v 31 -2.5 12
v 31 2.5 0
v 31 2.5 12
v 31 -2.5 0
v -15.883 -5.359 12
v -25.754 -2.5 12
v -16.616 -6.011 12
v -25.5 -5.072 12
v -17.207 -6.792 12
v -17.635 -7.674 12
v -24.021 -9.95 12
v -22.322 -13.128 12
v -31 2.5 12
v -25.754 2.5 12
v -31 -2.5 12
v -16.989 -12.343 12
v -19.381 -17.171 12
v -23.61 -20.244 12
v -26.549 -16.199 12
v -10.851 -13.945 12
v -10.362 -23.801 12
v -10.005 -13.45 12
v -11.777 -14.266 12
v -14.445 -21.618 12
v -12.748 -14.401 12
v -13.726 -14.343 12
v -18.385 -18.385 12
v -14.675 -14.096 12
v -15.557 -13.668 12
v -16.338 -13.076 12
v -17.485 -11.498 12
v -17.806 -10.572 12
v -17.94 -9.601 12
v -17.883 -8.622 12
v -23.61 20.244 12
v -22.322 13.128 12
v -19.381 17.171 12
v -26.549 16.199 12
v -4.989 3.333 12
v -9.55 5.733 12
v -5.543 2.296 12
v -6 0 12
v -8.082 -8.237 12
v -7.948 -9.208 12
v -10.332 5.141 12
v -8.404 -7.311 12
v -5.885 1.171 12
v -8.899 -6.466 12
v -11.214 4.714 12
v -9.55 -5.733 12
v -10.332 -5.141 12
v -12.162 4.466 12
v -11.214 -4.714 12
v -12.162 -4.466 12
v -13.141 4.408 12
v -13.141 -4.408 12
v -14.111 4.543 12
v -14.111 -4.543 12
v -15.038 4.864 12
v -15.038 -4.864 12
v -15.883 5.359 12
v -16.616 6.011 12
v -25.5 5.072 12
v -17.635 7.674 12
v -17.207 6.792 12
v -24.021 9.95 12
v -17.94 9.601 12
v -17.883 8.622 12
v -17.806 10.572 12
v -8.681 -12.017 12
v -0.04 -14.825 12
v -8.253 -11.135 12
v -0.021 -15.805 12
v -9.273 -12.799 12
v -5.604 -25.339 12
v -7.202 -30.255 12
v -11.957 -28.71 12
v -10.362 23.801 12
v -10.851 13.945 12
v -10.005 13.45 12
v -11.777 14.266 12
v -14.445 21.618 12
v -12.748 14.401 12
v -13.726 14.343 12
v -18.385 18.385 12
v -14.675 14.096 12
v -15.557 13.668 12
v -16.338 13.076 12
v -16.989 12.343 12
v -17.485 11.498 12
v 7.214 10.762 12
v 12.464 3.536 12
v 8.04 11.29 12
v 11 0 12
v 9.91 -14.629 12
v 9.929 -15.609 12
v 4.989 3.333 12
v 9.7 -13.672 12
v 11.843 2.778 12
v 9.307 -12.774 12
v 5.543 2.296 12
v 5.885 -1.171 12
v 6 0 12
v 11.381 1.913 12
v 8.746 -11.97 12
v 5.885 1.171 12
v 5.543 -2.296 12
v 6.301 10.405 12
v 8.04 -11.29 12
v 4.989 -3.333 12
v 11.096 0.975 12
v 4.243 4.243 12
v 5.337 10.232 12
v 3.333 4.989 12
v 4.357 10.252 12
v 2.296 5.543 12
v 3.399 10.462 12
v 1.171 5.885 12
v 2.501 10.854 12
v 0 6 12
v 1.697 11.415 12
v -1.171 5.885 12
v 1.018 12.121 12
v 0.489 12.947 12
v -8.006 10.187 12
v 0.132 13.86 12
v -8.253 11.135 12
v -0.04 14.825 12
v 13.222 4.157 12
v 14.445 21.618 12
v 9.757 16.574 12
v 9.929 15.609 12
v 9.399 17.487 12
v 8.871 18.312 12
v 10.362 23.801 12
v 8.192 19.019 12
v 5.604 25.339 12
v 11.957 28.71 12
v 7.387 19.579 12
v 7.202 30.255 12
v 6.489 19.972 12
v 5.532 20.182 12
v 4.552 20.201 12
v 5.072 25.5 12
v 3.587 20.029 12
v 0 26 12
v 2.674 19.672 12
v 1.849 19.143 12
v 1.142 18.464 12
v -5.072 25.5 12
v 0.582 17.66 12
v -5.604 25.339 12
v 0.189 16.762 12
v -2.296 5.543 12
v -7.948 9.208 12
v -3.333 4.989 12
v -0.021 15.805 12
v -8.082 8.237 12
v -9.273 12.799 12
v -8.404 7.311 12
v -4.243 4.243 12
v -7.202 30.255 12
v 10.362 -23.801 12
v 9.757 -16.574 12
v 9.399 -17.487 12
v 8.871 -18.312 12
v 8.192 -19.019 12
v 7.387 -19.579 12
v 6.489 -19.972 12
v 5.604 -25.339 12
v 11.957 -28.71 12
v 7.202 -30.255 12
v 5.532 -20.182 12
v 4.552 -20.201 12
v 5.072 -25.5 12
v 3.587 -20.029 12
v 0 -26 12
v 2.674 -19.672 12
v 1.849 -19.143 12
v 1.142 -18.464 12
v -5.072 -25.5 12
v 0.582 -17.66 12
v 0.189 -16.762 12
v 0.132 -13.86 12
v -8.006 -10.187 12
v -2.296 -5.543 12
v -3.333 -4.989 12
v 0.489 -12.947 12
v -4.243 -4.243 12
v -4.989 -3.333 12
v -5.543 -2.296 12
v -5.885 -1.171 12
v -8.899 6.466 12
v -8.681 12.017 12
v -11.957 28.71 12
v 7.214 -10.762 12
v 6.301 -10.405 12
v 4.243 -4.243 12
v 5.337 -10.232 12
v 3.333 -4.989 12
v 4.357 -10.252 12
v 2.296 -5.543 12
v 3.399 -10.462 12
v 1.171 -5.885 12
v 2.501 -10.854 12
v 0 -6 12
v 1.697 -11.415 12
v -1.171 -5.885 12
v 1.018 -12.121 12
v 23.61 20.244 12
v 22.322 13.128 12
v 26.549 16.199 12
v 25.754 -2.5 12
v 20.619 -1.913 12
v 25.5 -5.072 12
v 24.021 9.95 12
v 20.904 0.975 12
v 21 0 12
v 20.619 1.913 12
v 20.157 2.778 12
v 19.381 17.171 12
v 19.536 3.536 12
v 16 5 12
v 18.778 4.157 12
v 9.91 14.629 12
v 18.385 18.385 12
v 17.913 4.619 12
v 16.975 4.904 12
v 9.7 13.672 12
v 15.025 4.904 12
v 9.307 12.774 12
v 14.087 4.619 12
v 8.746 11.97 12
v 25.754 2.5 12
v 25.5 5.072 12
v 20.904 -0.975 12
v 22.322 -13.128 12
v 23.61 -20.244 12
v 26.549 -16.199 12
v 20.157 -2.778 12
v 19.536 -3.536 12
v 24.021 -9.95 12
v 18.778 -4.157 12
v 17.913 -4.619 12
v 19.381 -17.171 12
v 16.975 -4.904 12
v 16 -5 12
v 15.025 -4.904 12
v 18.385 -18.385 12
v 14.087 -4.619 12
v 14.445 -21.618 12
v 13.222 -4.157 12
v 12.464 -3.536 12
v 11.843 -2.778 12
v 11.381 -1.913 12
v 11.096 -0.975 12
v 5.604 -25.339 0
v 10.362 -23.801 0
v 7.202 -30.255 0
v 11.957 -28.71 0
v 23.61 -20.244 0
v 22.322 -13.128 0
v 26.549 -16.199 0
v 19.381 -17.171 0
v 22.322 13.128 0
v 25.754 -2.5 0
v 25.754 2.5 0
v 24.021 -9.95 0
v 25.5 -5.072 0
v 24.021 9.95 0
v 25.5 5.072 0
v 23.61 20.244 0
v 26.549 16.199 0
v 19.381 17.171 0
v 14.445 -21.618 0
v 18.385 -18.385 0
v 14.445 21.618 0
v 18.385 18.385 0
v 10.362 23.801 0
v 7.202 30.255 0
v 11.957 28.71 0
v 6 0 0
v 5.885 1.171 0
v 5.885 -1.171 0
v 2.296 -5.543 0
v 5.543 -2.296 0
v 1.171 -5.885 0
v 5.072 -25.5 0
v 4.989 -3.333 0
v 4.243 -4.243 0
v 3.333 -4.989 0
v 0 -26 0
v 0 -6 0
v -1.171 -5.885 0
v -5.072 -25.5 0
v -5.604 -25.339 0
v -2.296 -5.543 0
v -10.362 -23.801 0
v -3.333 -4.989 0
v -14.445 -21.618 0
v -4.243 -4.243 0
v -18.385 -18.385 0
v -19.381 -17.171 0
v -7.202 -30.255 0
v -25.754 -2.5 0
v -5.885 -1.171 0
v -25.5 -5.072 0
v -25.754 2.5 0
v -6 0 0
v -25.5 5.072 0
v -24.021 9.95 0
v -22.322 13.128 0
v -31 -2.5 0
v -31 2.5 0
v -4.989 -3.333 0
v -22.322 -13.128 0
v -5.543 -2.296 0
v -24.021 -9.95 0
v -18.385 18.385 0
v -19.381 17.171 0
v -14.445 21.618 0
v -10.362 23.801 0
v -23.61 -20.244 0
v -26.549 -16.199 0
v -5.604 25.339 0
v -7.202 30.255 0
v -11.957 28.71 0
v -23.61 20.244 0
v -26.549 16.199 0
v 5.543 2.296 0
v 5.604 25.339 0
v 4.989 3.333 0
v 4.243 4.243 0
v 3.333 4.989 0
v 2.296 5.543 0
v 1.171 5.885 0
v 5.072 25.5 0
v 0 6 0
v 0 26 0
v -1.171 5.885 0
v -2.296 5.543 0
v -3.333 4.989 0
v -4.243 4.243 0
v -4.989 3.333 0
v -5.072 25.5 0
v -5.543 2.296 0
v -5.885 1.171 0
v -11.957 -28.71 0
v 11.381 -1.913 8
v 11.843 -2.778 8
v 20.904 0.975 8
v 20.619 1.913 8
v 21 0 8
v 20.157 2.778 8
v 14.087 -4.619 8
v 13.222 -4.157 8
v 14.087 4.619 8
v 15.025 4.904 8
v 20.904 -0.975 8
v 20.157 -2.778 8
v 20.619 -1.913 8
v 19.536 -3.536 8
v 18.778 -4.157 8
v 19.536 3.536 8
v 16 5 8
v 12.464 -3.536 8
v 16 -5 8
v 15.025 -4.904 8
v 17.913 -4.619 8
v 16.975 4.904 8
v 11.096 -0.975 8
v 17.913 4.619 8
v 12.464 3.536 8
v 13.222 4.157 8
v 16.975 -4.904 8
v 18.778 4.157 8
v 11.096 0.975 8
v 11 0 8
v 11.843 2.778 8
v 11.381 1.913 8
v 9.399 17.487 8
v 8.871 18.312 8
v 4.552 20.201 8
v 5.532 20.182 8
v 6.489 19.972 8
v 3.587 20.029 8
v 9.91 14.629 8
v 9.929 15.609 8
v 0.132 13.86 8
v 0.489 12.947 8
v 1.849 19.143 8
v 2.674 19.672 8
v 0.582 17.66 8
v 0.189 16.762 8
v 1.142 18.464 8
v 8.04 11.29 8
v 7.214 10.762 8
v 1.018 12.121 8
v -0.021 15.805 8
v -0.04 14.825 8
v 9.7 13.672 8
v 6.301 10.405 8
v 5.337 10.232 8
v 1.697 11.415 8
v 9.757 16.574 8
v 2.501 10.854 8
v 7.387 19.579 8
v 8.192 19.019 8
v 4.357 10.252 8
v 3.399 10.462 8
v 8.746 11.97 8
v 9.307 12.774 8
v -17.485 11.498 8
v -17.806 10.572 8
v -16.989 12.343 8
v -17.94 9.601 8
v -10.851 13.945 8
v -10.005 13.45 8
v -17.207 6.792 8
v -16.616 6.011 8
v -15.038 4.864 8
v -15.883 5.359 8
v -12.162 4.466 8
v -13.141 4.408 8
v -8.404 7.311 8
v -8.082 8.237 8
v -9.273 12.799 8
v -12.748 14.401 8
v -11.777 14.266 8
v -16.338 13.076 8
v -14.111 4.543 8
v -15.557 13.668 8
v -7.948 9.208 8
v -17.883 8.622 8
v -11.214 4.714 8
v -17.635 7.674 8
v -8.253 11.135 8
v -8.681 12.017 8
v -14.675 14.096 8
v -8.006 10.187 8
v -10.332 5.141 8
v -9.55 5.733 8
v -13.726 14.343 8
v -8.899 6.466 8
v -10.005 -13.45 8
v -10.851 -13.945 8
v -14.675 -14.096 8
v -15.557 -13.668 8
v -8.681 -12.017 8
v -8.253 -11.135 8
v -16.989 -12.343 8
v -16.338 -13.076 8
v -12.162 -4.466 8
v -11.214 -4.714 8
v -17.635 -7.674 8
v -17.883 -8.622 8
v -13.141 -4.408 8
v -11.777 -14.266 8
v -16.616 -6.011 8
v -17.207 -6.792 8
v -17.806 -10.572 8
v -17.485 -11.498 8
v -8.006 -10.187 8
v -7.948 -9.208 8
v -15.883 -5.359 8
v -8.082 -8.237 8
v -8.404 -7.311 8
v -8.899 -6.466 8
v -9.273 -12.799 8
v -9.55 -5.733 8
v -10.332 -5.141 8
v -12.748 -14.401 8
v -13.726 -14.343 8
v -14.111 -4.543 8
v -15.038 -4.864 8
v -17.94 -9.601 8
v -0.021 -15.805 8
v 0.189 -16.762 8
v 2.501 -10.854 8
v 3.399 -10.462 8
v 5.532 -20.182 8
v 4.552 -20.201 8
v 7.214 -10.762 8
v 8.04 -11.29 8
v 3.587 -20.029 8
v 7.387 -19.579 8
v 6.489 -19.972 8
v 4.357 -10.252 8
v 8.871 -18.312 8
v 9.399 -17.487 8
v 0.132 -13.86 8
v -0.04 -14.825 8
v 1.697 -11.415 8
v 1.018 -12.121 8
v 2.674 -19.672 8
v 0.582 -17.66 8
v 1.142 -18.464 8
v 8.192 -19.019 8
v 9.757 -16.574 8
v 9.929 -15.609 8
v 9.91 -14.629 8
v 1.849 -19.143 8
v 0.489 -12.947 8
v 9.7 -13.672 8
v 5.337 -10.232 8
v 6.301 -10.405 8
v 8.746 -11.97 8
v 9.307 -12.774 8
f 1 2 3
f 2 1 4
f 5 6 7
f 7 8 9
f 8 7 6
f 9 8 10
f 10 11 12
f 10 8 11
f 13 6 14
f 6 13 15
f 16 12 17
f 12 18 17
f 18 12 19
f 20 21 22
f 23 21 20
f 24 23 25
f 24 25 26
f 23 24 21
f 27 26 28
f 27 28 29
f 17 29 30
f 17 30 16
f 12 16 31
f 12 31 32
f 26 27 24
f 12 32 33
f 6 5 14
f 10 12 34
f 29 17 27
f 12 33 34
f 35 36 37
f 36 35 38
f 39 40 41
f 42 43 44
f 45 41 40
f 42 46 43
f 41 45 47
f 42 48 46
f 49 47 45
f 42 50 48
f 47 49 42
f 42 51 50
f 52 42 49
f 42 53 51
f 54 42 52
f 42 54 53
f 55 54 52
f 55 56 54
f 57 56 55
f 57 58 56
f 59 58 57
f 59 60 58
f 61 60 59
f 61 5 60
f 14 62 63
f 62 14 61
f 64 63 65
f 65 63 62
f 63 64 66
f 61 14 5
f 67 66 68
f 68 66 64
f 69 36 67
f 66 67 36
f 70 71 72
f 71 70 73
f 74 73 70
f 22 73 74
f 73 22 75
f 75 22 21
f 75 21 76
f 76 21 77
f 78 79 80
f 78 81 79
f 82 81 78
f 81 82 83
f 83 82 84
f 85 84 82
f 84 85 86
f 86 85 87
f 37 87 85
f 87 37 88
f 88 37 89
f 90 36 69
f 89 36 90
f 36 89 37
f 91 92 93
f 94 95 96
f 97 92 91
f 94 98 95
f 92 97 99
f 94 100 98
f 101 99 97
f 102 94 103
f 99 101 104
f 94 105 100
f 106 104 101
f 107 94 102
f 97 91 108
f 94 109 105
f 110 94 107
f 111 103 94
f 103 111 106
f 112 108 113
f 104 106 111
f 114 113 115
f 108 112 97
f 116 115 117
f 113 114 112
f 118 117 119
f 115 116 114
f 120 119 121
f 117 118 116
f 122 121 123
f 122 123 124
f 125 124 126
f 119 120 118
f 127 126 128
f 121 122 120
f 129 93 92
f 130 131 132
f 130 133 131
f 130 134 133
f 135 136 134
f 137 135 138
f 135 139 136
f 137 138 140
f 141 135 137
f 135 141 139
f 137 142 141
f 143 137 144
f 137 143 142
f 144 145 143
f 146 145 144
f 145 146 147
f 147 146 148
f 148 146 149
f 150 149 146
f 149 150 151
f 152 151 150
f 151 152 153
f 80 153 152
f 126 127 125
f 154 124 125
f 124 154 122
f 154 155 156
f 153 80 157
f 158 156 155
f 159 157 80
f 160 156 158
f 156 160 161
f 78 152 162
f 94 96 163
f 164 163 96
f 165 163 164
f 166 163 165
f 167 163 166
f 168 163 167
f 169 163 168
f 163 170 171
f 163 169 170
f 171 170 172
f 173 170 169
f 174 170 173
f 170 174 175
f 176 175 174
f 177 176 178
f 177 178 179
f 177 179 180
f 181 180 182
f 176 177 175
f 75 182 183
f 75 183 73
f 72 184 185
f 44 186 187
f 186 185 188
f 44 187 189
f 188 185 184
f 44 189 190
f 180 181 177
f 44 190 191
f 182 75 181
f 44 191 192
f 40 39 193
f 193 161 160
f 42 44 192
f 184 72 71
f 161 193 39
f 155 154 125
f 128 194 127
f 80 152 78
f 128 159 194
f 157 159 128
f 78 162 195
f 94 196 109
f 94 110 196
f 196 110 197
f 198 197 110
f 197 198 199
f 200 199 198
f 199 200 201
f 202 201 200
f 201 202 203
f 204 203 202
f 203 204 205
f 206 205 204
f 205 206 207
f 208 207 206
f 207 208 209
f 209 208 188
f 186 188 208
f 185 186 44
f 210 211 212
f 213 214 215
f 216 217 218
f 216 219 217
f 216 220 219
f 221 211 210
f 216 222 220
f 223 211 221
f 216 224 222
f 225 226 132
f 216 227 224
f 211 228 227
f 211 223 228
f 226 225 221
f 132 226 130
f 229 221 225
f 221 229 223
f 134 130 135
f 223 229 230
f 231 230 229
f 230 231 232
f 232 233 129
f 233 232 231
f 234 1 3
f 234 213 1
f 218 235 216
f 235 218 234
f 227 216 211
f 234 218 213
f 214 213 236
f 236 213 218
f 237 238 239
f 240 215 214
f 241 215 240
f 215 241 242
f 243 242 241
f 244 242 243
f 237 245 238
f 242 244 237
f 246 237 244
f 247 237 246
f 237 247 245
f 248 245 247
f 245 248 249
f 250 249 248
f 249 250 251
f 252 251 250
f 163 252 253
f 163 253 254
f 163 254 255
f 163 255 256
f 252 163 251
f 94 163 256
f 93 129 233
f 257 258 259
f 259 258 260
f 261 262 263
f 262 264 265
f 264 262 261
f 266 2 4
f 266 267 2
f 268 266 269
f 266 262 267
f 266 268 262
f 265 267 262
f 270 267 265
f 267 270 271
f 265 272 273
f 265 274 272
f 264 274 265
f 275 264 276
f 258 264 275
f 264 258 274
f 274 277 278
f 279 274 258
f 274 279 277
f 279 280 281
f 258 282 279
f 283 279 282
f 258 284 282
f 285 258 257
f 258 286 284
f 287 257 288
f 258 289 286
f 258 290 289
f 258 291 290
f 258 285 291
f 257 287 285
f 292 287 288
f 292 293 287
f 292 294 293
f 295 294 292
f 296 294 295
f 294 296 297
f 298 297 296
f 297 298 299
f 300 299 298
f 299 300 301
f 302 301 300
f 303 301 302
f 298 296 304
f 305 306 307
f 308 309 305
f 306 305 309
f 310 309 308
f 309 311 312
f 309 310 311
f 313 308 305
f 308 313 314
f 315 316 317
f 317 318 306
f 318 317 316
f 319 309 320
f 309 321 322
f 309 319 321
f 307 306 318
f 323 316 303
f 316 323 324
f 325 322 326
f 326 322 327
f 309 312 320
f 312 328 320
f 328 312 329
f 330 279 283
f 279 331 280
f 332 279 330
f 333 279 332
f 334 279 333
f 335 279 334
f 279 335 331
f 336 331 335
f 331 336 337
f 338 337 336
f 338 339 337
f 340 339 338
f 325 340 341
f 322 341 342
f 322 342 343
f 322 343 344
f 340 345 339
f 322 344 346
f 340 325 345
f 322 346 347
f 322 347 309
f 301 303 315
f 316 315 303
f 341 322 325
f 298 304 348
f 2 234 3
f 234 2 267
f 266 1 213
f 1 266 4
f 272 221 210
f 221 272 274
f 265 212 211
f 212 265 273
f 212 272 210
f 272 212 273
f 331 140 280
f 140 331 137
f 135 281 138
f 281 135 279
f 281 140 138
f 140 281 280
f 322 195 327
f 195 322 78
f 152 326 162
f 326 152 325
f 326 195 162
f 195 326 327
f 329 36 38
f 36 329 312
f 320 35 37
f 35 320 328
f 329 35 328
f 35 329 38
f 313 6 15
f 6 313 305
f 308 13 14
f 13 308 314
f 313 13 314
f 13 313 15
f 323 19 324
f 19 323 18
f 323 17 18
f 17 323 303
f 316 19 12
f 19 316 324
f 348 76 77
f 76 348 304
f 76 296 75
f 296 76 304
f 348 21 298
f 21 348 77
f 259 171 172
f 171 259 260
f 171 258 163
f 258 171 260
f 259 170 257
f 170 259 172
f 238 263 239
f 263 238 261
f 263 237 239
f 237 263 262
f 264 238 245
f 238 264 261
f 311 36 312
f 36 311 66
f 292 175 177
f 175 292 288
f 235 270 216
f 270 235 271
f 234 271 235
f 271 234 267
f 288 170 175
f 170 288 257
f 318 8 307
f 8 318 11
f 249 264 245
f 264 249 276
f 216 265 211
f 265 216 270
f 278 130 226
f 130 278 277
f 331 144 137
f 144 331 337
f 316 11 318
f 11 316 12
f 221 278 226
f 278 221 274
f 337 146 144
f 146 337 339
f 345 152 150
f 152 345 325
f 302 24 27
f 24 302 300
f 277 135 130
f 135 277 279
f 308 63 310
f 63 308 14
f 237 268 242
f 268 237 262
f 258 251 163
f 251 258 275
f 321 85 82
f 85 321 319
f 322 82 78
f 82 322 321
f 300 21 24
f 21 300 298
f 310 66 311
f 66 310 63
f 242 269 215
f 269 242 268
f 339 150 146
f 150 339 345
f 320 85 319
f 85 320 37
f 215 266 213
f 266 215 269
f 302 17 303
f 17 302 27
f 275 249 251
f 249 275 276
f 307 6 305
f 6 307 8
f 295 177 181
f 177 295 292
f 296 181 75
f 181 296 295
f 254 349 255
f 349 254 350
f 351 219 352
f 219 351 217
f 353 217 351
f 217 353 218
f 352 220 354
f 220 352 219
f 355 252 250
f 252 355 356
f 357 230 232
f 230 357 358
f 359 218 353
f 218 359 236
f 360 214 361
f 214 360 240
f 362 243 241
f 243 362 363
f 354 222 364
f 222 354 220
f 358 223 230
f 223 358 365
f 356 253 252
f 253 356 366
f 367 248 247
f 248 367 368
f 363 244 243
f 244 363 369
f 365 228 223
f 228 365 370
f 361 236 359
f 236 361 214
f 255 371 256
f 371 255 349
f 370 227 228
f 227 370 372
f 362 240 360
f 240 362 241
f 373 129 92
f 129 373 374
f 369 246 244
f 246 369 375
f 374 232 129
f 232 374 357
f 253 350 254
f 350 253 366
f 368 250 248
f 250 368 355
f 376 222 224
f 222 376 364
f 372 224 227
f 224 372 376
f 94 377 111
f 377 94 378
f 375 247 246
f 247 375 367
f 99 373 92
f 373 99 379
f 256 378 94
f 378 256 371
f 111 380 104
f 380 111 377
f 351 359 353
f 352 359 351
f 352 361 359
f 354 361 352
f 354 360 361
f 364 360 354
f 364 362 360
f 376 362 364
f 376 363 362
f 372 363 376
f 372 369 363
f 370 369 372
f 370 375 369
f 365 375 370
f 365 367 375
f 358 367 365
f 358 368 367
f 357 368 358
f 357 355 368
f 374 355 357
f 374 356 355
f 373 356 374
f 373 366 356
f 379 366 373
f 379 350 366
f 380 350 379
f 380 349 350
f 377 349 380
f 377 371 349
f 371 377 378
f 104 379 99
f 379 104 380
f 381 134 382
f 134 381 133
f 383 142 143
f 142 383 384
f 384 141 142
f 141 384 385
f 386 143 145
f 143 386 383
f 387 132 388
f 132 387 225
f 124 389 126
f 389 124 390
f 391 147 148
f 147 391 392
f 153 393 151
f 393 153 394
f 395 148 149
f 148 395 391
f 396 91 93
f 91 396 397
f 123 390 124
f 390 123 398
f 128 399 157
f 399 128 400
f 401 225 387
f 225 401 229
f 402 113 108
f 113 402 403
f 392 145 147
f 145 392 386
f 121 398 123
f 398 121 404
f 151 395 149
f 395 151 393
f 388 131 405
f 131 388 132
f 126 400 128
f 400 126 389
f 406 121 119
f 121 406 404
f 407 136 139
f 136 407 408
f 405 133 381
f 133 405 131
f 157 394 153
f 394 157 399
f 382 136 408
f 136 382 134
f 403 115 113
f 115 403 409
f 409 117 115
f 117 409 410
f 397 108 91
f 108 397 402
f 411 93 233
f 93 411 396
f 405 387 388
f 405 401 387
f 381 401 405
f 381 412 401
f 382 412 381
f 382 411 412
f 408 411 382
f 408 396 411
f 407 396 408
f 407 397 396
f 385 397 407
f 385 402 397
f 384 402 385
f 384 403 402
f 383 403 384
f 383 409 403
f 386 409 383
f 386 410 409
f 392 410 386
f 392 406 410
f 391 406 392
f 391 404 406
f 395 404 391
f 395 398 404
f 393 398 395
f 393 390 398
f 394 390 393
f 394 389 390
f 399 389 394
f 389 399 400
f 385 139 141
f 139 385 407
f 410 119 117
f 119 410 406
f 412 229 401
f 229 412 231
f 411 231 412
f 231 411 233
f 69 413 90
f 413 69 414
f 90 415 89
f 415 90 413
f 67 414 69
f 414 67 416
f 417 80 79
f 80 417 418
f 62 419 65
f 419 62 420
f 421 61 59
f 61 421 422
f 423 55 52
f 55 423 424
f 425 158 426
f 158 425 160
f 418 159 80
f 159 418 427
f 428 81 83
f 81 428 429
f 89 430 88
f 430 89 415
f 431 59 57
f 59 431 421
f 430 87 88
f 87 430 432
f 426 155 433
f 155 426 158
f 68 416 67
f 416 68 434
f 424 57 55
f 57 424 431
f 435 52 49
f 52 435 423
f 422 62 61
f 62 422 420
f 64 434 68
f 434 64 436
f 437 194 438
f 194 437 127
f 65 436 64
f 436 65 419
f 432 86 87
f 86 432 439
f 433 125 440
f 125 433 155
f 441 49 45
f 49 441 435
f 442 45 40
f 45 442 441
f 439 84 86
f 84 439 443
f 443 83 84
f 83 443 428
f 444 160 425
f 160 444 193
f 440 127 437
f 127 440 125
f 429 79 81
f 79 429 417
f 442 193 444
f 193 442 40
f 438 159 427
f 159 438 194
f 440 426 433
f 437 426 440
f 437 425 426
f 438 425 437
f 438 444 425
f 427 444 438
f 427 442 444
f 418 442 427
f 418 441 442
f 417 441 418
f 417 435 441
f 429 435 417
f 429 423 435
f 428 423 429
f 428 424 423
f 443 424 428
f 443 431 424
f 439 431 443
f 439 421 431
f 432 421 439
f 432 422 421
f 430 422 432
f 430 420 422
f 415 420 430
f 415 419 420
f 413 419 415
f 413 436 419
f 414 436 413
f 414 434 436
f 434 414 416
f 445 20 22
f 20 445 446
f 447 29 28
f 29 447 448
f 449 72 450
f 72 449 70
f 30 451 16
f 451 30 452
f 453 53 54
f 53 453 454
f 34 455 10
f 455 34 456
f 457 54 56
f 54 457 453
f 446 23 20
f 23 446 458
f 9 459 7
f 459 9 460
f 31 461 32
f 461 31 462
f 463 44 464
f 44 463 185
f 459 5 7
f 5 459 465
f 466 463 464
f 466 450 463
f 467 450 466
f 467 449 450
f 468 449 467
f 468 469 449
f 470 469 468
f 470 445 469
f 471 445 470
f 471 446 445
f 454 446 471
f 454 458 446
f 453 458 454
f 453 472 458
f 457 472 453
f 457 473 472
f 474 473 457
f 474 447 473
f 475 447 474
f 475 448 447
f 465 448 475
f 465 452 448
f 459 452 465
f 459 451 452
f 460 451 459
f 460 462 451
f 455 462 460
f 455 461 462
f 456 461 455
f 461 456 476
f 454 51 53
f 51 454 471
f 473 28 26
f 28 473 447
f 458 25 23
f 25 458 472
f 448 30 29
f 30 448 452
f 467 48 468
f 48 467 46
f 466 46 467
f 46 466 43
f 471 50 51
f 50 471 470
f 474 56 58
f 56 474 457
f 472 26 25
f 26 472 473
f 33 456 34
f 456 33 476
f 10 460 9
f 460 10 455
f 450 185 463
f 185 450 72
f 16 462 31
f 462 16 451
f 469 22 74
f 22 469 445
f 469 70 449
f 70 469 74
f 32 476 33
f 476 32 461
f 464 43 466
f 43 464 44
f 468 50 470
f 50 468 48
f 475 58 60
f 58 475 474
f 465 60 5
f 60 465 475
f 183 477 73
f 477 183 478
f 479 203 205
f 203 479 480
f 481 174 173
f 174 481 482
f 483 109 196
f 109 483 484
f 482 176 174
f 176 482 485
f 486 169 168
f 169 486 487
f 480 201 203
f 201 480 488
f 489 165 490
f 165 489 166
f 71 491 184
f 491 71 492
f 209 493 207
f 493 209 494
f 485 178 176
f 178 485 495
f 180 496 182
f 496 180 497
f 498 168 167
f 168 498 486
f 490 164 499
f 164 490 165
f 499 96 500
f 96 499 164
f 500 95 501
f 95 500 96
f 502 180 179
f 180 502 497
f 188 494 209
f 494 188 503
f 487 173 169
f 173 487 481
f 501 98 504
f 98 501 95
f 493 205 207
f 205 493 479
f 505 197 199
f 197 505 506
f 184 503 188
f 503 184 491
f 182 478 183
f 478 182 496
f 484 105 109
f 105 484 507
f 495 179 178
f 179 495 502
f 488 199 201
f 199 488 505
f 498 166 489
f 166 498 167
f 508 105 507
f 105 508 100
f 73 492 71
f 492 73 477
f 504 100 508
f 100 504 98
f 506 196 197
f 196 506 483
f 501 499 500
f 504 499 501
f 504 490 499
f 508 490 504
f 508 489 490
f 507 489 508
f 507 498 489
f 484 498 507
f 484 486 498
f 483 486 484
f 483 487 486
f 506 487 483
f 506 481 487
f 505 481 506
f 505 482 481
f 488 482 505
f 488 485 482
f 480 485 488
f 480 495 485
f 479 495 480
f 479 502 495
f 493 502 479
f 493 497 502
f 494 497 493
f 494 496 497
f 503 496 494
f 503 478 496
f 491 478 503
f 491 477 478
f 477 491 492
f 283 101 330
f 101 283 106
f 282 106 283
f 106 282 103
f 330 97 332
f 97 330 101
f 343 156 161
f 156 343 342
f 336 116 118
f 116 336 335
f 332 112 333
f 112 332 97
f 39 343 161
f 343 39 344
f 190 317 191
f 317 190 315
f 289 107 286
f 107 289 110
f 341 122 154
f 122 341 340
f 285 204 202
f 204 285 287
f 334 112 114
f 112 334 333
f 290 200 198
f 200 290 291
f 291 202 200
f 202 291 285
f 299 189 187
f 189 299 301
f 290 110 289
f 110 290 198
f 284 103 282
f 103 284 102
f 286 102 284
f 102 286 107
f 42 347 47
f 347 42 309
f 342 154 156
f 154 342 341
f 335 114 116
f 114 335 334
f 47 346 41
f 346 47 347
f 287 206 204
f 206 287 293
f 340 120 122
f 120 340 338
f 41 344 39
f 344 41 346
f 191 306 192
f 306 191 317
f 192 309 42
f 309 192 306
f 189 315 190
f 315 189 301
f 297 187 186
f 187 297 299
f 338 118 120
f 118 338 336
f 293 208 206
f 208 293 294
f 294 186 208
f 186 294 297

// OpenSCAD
$fn = 32;

// ----------------------------------------------------------------------
// Spur blank: lightened gear blank
// ----------------------------------------------------------------------

// --- parameters (mm) ---
disc_r = 26;              // blank root radius
disc_t = 12;              // blank thickness
n_teeth = 10;             // stub tooth count
tooth_w = 5;              // tooth width at the root
tooth_h = 5;              // tooth height above the root
bore_r = 6;               // central bore radius
ring_r = 16;              // lightening pocket ring radius
pocket_r = 5;             // lightening pocket radius

out_r = disc_r + tooth_h;  // tip radius
bbox_x = 62.0;  // measured width over the teeth
bbox_y = 60.51;  // measured depth over the teeth

difference() {
union() {
  cylinder(r = disc_r, h = disc_t);
  for (i = [0 : n_teeth - 1])
    rotate([0, 0, i * 360 / n_teeth])
      translate([disc_r - 1, -tooth_w / 2, 0])
        cube([tooth_h + 1, tooth_w, disc_t]);
}
  translate([0, 0, -1]) cylinder(r = bore_r, h = disc_t + 2);
  for (i = [0 : 5])
    rotate([0, 0, i * 72])
      translate([ring_r, 0, disc_t - 4])
        cylinder(r = pocket_r, h = 5);
}
